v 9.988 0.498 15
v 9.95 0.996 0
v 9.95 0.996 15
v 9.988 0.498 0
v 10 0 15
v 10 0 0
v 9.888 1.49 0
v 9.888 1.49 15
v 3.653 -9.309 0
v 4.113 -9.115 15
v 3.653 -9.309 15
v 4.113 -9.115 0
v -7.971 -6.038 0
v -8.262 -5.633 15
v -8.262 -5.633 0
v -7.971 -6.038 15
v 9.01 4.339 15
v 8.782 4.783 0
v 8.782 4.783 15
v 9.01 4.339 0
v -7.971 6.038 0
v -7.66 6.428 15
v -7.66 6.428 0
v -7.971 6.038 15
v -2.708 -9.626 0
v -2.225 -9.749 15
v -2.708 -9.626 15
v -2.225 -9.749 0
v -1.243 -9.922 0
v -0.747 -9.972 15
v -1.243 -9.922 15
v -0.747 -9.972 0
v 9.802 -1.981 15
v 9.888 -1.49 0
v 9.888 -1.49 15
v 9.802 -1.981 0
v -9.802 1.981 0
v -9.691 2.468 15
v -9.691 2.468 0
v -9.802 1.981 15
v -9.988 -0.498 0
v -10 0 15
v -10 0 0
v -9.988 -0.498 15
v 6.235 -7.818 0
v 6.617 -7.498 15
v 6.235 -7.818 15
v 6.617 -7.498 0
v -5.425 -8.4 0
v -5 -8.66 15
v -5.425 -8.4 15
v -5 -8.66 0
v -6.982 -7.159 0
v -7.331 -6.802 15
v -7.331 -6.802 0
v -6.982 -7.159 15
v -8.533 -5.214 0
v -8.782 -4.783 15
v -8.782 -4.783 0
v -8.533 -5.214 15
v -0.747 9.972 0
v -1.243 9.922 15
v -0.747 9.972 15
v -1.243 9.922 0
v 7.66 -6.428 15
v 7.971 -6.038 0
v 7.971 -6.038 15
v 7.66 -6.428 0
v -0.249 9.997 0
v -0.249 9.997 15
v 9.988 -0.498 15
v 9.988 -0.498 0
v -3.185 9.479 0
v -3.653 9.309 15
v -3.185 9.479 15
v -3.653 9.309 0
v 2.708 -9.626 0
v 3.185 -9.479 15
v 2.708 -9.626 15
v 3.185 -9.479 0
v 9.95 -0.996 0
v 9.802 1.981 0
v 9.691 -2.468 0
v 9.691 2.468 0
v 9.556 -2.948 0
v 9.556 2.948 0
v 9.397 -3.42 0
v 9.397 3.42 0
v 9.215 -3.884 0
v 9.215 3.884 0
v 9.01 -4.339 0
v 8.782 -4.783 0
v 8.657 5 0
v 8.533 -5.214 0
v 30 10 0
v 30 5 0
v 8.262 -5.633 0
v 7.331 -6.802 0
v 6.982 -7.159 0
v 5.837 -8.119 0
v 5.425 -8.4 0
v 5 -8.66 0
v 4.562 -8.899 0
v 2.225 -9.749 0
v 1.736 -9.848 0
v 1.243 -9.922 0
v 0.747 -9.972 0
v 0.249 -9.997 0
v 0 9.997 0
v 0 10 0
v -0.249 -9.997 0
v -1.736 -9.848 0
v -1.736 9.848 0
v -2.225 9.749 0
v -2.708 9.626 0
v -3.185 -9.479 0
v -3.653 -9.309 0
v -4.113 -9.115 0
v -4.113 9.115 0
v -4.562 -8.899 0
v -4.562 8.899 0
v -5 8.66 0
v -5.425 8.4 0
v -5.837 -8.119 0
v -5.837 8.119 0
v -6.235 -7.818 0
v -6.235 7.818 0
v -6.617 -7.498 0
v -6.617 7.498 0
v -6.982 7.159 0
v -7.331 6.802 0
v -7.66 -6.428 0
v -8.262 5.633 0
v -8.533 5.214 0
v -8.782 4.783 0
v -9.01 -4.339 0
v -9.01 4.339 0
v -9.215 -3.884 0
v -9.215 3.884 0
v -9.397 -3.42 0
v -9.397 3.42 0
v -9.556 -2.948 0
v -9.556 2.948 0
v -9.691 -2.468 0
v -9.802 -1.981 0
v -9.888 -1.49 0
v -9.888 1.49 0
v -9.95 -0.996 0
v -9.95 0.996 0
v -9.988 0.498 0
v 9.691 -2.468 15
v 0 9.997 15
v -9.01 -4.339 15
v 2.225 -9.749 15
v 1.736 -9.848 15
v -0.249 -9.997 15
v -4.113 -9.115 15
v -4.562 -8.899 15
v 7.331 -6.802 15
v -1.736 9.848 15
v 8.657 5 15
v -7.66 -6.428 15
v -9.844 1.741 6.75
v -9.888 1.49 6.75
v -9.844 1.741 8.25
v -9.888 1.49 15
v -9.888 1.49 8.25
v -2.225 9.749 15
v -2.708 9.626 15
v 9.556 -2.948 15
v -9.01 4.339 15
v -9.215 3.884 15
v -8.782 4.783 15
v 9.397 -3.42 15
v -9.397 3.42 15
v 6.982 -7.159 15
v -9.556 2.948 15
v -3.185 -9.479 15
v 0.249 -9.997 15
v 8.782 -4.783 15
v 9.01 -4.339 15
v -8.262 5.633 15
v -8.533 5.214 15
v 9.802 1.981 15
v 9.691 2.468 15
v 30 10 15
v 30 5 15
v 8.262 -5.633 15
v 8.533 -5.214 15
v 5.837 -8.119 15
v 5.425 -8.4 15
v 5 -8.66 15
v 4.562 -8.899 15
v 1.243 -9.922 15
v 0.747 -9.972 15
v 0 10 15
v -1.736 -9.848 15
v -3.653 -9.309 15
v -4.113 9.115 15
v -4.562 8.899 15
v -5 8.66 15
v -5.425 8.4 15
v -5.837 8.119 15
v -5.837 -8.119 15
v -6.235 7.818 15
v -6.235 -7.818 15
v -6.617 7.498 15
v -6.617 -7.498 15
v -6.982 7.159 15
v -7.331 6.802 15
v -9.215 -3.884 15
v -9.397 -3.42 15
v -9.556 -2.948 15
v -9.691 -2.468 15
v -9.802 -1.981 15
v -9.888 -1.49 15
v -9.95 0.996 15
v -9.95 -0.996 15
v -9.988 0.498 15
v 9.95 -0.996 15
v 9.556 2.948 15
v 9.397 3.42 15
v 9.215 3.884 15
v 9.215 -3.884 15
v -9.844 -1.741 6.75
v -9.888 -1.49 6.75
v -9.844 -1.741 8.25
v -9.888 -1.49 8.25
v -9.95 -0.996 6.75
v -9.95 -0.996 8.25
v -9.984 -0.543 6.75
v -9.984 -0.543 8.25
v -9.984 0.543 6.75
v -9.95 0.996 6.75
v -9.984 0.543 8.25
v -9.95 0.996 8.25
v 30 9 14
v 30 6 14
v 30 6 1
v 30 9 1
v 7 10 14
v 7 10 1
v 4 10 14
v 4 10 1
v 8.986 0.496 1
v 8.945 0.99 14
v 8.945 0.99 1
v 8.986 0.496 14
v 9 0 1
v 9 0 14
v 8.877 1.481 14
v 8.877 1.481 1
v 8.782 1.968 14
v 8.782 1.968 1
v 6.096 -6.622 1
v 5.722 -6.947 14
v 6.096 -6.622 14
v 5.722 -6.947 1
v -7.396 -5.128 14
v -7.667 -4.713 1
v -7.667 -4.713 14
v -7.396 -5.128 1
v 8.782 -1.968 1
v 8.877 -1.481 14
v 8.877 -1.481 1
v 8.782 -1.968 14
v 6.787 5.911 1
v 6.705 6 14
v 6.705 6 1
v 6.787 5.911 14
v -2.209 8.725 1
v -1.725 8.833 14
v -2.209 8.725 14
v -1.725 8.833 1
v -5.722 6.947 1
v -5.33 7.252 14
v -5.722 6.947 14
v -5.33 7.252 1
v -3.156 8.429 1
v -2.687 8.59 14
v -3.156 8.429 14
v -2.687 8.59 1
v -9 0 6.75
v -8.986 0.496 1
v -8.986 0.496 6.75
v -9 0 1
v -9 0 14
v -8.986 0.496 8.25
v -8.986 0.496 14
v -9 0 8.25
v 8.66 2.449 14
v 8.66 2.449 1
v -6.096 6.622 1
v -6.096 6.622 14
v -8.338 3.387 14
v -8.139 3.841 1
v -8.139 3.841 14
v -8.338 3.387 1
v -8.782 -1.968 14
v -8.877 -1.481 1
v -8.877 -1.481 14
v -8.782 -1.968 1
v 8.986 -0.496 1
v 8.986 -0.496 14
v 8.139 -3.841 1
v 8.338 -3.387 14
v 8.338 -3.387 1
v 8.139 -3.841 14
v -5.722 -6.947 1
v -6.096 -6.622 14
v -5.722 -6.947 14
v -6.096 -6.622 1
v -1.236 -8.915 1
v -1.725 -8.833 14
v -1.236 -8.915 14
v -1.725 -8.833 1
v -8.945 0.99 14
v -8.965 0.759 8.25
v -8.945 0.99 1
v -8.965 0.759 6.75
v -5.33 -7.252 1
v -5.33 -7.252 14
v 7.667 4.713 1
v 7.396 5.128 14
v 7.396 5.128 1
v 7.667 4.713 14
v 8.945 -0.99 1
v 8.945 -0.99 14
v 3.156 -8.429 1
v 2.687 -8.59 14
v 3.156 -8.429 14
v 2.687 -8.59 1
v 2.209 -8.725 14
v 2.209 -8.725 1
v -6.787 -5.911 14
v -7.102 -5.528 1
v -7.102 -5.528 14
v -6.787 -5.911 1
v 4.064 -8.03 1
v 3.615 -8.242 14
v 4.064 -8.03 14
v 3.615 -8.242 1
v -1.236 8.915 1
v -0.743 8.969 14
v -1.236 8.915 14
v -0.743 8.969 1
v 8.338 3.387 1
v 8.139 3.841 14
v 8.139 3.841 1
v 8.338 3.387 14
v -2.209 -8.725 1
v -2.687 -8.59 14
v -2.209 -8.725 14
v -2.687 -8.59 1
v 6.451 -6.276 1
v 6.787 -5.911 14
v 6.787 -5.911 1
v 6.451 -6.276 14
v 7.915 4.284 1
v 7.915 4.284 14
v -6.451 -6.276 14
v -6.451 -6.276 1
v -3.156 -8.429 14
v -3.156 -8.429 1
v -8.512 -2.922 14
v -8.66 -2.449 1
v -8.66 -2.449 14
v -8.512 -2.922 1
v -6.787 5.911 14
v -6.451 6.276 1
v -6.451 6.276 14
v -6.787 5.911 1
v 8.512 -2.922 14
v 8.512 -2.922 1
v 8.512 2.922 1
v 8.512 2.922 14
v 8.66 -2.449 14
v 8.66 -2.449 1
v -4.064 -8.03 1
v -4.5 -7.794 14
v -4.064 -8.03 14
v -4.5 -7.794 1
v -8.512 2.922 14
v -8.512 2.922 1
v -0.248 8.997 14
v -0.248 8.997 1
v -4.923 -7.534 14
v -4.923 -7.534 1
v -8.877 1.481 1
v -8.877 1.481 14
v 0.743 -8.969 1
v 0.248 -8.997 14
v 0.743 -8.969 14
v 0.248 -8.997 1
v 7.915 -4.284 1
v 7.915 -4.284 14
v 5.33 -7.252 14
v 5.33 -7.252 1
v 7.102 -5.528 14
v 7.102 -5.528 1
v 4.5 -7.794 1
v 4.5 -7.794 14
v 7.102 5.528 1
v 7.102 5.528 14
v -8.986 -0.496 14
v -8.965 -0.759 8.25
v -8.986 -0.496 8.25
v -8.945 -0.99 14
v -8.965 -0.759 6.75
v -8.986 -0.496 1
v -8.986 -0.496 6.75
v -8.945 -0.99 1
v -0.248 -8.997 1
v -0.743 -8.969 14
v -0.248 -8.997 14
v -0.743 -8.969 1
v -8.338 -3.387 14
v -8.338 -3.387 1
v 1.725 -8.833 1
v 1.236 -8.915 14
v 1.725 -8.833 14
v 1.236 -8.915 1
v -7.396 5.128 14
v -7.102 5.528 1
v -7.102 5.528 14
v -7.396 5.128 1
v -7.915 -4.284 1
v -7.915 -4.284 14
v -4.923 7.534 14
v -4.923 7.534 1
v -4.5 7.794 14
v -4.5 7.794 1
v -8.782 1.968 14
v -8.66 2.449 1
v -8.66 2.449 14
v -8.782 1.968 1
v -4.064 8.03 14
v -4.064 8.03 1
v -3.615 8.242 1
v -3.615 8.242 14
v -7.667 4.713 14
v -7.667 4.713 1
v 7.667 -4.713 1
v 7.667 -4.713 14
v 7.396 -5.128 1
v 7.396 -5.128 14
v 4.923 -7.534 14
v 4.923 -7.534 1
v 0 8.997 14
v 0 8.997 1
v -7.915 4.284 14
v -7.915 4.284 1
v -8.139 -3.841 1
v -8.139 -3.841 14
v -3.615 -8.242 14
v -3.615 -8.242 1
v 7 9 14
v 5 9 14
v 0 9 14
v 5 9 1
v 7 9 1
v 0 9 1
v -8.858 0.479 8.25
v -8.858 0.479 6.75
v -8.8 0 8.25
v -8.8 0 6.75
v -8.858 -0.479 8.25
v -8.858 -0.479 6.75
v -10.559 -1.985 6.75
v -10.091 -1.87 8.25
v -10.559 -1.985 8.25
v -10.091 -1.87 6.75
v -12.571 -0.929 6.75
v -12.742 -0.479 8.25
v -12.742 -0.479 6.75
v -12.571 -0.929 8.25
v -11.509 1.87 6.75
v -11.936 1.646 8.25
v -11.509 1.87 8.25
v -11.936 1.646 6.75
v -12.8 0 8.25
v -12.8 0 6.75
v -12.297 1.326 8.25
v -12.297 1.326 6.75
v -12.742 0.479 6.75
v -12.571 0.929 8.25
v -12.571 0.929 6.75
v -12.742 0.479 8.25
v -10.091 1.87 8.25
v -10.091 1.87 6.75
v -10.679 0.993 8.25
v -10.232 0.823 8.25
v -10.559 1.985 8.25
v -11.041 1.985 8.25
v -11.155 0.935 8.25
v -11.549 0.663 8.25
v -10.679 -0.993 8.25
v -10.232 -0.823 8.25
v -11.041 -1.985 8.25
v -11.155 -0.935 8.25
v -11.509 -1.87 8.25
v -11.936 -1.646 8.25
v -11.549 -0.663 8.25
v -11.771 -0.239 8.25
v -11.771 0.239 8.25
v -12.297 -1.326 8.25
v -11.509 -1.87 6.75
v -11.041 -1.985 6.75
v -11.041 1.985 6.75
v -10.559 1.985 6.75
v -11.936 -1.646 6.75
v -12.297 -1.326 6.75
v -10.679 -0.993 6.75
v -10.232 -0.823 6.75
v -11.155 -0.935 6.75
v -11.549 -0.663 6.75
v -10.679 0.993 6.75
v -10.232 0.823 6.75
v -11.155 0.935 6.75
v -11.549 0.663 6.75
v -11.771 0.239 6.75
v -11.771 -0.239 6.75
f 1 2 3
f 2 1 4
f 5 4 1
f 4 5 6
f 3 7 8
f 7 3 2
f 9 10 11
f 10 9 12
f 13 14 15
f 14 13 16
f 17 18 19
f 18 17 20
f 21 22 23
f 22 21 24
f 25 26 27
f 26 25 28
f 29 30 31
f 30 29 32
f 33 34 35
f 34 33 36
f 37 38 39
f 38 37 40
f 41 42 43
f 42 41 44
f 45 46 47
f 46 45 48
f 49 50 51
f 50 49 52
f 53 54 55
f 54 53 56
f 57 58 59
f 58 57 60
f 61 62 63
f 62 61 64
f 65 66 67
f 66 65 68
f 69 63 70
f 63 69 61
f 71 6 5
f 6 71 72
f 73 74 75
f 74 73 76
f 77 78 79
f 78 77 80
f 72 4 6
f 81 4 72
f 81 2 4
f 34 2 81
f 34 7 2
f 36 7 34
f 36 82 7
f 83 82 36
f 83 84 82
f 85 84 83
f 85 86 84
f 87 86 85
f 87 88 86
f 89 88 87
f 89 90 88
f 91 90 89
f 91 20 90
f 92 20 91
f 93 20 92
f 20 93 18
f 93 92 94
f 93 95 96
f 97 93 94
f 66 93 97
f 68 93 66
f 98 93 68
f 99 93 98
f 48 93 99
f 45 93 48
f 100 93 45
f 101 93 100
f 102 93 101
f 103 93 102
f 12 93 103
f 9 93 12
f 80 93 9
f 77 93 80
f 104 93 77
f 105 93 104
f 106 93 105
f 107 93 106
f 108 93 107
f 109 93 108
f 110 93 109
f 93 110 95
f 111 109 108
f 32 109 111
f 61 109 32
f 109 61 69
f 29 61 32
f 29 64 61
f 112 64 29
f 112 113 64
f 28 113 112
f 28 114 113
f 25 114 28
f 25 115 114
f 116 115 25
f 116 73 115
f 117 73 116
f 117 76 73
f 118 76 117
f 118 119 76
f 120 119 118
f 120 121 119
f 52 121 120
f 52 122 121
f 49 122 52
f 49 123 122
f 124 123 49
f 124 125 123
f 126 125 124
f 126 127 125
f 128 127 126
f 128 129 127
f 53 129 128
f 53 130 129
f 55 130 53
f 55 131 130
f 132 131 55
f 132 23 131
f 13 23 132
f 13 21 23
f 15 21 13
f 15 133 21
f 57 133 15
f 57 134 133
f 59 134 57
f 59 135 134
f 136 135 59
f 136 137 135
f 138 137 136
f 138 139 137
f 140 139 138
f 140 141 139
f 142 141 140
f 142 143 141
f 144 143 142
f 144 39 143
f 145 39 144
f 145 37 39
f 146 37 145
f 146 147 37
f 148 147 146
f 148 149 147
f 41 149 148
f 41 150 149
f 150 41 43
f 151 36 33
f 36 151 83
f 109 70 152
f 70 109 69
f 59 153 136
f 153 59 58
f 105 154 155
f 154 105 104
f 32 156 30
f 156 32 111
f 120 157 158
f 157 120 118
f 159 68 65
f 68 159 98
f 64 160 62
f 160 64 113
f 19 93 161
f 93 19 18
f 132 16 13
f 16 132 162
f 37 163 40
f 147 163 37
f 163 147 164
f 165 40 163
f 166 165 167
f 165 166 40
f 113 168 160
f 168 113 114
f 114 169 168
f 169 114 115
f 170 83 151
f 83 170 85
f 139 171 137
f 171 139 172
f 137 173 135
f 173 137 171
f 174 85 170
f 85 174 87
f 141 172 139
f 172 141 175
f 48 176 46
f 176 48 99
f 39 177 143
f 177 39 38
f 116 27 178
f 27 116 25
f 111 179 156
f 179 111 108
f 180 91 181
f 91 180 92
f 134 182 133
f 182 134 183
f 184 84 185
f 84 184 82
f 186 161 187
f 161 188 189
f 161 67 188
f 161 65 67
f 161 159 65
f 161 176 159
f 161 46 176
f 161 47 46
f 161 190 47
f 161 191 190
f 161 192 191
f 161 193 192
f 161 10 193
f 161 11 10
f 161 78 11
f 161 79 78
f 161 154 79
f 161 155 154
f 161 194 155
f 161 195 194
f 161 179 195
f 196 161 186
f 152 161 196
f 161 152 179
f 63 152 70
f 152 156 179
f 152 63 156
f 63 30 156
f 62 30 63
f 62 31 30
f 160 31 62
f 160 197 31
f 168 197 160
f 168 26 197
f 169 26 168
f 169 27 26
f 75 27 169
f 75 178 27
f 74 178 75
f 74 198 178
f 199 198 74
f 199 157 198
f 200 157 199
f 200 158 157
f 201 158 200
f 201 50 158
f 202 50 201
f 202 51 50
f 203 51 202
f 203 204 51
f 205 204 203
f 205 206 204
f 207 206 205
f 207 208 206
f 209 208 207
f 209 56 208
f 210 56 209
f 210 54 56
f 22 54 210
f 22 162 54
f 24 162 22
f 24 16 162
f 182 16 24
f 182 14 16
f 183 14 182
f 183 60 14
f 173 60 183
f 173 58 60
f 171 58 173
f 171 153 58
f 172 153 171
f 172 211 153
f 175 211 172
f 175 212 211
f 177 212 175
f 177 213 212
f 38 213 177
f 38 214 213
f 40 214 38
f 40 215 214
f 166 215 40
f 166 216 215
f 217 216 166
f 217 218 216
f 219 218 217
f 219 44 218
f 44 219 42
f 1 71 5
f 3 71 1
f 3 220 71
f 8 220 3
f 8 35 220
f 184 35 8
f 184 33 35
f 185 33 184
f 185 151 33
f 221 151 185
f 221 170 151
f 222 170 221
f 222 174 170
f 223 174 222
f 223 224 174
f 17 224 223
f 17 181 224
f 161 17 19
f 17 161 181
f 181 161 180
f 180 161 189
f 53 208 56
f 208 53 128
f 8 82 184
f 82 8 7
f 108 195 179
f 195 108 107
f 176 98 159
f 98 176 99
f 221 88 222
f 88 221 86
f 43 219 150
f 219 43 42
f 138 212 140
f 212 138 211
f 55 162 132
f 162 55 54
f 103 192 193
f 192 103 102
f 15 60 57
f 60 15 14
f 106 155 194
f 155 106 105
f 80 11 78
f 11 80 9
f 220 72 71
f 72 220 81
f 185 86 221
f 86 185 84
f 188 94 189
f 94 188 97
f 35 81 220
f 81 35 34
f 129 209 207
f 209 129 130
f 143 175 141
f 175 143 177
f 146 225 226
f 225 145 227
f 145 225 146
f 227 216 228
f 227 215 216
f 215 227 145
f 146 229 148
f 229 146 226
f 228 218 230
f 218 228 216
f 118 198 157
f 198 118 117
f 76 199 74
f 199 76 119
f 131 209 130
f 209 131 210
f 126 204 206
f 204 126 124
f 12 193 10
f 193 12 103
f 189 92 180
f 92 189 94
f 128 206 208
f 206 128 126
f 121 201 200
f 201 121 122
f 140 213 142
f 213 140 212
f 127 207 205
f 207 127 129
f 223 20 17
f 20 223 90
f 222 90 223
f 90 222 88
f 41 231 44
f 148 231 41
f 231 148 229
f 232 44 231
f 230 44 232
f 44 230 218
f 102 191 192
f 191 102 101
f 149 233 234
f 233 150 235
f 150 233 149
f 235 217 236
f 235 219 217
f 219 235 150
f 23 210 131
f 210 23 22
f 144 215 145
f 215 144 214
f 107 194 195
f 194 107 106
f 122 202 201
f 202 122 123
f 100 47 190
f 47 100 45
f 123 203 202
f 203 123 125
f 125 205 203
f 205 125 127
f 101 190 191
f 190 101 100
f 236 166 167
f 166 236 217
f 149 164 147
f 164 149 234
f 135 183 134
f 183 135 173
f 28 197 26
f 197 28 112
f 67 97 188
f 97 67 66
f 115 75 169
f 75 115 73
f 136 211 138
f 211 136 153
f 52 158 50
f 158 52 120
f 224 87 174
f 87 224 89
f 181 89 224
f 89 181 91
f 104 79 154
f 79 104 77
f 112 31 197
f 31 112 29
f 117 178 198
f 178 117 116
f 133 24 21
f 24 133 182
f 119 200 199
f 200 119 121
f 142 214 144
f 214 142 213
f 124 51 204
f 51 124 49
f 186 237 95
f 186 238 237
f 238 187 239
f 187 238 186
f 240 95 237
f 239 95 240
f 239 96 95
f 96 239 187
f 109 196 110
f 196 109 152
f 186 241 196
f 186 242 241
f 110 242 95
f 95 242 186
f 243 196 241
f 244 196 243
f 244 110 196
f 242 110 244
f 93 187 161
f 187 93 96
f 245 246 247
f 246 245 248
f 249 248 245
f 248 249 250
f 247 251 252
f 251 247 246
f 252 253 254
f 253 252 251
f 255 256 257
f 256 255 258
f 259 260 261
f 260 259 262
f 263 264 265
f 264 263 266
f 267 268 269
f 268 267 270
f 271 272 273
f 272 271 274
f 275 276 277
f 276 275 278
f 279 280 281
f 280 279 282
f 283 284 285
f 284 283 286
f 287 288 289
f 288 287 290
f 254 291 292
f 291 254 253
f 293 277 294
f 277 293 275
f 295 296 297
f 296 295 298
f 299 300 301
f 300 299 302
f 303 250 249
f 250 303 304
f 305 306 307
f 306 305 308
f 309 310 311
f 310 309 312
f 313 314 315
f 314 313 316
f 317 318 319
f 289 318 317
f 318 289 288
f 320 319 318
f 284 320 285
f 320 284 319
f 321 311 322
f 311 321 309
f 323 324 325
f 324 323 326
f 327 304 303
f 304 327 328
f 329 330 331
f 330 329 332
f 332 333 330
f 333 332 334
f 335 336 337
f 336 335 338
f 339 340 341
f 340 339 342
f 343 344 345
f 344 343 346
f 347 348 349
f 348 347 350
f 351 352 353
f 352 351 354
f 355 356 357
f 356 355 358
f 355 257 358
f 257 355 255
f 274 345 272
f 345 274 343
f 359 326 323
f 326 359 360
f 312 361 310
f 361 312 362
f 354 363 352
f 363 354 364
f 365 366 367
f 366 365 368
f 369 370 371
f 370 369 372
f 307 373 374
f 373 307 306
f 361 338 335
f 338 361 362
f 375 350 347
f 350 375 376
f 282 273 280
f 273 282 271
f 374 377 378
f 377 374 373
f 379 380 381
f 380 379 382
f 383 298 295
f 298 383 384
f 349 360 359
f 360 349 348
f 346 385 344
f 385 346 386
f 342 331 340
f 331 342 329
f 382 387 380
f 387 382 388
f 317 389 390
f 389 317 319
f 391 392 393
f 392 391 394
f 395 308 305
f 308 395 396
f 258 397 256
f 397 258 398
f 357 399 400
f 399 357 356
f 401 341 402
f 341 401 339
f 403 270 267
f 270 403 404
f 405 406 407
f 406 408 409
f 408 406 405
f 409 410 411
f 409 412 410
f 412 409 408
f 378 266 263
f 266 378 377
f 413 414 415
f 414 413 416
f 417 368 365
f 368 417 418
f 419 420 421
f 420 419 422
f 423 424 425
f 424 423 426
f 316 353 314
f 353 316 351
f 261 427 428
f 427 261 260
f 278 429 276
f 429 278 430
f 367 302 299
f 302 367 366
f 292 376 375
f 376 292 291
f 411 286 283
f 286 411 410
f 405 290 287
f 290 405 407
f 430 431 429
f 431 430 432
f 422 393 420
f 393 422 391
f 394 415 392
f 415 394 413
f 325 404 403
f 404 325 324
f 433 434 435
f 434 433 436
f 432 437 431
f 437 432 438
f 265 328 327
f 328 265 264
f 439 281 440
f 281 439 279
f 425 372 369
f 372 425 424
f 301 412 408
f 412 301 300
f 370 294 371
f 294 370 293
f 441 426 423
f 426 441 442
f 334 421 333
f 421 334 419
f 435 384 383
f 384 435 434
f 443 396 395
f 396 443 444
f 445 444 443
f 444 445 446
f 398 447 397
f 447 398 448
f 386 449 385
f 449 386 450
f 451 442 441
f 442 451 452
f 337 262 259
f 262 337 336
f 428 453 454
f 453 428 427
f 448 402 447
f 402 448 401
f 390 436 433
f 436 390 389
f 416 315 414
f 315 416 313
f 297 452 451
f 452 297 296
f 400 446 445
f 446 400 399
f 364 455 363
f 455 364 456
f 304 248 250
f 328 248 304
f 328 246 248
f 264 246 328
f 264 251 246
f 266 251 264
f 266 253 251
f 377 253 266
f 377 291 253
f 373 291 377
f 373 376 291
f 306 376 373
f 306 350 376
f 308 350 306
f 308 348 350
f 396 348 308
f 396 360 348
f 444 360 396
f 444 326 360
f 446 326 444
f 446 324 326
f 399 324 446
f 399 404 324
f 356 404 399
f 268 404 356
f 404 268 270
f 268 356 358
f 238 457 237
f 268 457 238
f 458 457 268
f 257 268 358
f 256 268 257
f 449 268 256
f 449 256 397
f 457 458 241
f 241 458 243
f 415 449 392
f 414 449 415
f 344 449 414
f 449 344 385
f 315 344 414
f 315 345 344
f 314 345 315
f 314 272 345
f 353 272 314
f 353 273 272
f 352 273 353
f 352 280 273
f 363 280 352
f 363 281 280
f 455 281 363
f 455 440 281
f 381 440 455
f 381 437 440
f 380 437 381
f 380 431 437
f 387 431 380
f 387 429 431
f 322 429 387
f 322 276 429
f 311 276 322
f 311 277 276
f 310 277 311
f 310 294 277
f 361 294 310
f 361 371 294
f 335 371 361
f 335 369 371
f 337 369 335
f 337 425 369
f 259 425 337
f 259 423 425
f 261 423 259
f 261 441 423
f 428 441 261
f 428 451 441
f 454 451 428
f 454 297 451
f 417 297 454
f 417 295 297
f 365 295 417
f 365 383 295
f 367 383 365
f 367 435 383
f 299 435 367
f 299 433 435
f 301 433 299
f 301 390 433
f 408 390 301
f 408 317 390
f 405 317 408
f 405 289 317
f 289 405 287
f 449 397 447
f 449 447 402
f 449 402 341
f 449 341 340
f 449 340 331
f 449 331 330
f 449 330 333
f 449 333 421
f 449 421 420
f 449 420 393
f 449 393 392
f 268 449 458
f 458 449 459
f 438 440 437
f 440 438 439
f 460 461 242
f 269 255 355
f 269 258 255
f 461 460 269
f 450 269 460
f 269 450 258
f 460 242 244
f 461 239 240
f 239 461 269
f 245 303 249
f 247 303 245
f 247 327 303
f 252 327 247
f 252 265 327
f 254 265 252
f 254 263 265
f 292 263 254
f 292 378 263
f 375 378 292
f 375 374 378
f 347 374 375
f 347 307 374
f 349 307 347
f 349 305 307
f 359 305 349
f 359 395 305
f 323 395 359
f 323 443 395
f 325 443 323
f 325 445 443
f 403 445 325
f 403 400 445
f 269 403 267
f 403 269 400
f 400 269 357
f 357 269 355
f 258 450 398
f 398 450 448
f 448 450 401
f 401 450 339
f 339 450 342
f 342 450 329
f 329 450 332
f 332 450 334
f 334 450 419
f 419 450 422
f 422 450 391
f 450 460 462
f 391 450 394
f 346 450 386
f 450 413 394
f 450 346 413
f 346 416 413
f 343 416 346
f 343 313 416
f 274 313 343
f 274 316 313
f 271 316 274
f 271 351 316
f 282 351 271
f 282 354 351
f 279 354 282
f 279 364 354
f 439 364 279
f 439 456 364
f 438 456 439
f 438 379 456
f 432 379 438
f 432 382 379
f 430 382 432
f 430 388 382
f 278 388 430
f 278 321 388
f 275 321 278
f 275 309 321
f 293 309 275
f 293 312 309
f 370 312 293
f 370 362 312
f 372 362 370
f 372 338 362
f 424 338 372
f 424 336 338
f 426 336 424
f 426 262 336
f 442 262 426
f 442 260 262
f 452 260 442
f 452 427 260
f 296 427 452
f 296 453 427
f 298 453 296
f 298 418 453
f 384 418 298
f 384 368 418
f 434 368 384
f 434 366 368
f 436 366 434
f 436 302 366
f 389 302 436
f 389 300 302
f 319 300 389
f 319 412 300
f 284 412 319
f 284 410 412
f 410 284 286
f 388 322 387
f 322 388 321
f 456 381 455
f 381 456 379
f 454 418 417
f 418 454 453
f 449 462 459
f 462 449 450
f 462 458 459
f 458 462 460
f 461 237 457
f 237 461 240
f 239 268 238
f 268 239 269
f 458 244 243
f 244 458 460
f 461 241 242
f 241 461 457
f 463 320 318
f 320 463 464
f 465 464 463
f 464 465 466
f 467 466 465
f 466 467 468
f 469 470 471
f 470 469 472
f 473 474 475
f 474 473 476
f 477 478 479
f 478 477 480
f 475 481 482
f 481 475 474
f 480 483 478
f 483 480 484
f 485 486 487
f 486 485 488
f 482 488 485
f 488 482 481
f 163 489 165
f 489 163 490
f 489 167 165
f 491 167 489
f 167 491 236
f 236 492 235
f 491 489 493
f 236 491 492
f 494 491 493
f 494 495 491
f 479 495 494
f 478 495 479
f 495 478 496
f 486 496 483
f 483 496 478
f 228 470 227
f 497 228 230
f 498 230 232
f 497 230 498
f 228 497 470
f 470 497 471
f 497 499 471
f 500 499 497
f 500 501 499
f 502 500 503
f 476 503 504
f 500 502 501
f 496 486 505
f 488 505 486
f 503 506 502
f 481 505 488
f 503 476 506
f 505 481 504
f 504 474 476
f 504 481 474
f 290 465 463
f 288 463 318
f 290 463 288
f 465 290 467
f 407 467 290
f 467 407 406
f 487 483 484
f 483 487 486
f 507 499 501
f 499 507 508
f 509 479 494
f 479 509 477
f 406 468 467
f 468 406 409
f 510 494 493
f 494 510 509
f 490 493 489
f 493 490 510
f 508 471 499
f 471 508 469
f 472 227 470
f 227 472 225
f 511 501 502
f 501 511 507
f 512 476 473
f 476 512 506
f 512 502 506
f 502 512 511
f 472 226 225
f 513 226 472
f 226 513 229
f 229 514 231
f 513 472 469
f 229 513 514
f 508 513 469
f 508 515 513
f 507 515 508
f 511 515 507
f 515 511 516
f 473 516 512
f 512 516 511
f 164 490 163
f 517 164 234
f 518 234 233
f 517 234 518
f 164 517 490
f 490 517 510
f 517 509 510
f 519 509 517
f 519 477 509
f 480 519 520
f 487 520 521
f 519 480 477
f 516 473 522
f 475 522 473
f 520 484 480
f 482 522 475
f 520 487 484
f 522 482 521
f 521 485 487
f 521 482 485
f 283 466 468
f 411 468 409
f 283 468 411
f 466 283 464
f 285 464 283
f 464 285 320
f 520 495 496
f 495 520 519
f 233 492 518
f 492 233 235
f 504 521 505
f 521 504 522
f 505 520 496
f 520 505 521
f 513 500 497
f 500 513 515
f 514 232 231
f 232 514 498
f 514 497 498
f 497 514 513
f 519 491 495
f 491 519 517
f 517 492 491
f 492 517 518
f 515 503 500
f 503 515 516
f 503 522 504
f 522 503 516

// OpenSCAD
//Basic whistle
$fs = 0.5; //Set to 0.5 before final compile/rendering
$fa = 0.5; //Set to 0.5 before final compile/rendering
dc = 20; //O.D of cylinder
lb = 30; //length of blower part measured from the centerline of cylinder
tb = 5; //outer thickness of blower part
tw = 1; //wall thickness
ht = 15; //height of the whistle
di = dc - 2*tw; //diameter of inner shape
hti = ht - 2*tw; //height of inner shape
tbi = tb - 2*tw; //thickness of blower section in inner shape
dh = 4*tw; //for the chord hole
th = tw*1.5; //for the chord hole
union(){
	//main body
	difference(){
		difference(){
			//Outer hull
			union(){
				cylinder(r=dc/2, h=ht, center=false);
				translate([0,(dc/2) -tb,0]) cube([lb,tb,ht]);
			}
			color([0,0,1]){
				translate([0,0,tw]){
					//Inner shape
					union(){
						cylinder(r=di/2, h=hti, center=false);
						translate([0,(di/2)-tbi,0]) cube([lb,tbi,hti]);
					}
				}
			}
		}

		//for the notch
		color([1,0,0]){
			translate([dc/4,dc/2,tw])
			union(){
				cylinder(r=tw, h=hti,$fn=4);
				translate([0,-1*tw,0]) cube([2*tw,2*tw,hti]);
			}
		}
	}

	//This is the chord holder
	translate([-1*(dc/2 + dh/5),0,(ht-th)/2]){
		difference(){
			cylinder(r=dh/2,h=th);
			cylinder(r=dh/4,h=th);
		}
	}
}
